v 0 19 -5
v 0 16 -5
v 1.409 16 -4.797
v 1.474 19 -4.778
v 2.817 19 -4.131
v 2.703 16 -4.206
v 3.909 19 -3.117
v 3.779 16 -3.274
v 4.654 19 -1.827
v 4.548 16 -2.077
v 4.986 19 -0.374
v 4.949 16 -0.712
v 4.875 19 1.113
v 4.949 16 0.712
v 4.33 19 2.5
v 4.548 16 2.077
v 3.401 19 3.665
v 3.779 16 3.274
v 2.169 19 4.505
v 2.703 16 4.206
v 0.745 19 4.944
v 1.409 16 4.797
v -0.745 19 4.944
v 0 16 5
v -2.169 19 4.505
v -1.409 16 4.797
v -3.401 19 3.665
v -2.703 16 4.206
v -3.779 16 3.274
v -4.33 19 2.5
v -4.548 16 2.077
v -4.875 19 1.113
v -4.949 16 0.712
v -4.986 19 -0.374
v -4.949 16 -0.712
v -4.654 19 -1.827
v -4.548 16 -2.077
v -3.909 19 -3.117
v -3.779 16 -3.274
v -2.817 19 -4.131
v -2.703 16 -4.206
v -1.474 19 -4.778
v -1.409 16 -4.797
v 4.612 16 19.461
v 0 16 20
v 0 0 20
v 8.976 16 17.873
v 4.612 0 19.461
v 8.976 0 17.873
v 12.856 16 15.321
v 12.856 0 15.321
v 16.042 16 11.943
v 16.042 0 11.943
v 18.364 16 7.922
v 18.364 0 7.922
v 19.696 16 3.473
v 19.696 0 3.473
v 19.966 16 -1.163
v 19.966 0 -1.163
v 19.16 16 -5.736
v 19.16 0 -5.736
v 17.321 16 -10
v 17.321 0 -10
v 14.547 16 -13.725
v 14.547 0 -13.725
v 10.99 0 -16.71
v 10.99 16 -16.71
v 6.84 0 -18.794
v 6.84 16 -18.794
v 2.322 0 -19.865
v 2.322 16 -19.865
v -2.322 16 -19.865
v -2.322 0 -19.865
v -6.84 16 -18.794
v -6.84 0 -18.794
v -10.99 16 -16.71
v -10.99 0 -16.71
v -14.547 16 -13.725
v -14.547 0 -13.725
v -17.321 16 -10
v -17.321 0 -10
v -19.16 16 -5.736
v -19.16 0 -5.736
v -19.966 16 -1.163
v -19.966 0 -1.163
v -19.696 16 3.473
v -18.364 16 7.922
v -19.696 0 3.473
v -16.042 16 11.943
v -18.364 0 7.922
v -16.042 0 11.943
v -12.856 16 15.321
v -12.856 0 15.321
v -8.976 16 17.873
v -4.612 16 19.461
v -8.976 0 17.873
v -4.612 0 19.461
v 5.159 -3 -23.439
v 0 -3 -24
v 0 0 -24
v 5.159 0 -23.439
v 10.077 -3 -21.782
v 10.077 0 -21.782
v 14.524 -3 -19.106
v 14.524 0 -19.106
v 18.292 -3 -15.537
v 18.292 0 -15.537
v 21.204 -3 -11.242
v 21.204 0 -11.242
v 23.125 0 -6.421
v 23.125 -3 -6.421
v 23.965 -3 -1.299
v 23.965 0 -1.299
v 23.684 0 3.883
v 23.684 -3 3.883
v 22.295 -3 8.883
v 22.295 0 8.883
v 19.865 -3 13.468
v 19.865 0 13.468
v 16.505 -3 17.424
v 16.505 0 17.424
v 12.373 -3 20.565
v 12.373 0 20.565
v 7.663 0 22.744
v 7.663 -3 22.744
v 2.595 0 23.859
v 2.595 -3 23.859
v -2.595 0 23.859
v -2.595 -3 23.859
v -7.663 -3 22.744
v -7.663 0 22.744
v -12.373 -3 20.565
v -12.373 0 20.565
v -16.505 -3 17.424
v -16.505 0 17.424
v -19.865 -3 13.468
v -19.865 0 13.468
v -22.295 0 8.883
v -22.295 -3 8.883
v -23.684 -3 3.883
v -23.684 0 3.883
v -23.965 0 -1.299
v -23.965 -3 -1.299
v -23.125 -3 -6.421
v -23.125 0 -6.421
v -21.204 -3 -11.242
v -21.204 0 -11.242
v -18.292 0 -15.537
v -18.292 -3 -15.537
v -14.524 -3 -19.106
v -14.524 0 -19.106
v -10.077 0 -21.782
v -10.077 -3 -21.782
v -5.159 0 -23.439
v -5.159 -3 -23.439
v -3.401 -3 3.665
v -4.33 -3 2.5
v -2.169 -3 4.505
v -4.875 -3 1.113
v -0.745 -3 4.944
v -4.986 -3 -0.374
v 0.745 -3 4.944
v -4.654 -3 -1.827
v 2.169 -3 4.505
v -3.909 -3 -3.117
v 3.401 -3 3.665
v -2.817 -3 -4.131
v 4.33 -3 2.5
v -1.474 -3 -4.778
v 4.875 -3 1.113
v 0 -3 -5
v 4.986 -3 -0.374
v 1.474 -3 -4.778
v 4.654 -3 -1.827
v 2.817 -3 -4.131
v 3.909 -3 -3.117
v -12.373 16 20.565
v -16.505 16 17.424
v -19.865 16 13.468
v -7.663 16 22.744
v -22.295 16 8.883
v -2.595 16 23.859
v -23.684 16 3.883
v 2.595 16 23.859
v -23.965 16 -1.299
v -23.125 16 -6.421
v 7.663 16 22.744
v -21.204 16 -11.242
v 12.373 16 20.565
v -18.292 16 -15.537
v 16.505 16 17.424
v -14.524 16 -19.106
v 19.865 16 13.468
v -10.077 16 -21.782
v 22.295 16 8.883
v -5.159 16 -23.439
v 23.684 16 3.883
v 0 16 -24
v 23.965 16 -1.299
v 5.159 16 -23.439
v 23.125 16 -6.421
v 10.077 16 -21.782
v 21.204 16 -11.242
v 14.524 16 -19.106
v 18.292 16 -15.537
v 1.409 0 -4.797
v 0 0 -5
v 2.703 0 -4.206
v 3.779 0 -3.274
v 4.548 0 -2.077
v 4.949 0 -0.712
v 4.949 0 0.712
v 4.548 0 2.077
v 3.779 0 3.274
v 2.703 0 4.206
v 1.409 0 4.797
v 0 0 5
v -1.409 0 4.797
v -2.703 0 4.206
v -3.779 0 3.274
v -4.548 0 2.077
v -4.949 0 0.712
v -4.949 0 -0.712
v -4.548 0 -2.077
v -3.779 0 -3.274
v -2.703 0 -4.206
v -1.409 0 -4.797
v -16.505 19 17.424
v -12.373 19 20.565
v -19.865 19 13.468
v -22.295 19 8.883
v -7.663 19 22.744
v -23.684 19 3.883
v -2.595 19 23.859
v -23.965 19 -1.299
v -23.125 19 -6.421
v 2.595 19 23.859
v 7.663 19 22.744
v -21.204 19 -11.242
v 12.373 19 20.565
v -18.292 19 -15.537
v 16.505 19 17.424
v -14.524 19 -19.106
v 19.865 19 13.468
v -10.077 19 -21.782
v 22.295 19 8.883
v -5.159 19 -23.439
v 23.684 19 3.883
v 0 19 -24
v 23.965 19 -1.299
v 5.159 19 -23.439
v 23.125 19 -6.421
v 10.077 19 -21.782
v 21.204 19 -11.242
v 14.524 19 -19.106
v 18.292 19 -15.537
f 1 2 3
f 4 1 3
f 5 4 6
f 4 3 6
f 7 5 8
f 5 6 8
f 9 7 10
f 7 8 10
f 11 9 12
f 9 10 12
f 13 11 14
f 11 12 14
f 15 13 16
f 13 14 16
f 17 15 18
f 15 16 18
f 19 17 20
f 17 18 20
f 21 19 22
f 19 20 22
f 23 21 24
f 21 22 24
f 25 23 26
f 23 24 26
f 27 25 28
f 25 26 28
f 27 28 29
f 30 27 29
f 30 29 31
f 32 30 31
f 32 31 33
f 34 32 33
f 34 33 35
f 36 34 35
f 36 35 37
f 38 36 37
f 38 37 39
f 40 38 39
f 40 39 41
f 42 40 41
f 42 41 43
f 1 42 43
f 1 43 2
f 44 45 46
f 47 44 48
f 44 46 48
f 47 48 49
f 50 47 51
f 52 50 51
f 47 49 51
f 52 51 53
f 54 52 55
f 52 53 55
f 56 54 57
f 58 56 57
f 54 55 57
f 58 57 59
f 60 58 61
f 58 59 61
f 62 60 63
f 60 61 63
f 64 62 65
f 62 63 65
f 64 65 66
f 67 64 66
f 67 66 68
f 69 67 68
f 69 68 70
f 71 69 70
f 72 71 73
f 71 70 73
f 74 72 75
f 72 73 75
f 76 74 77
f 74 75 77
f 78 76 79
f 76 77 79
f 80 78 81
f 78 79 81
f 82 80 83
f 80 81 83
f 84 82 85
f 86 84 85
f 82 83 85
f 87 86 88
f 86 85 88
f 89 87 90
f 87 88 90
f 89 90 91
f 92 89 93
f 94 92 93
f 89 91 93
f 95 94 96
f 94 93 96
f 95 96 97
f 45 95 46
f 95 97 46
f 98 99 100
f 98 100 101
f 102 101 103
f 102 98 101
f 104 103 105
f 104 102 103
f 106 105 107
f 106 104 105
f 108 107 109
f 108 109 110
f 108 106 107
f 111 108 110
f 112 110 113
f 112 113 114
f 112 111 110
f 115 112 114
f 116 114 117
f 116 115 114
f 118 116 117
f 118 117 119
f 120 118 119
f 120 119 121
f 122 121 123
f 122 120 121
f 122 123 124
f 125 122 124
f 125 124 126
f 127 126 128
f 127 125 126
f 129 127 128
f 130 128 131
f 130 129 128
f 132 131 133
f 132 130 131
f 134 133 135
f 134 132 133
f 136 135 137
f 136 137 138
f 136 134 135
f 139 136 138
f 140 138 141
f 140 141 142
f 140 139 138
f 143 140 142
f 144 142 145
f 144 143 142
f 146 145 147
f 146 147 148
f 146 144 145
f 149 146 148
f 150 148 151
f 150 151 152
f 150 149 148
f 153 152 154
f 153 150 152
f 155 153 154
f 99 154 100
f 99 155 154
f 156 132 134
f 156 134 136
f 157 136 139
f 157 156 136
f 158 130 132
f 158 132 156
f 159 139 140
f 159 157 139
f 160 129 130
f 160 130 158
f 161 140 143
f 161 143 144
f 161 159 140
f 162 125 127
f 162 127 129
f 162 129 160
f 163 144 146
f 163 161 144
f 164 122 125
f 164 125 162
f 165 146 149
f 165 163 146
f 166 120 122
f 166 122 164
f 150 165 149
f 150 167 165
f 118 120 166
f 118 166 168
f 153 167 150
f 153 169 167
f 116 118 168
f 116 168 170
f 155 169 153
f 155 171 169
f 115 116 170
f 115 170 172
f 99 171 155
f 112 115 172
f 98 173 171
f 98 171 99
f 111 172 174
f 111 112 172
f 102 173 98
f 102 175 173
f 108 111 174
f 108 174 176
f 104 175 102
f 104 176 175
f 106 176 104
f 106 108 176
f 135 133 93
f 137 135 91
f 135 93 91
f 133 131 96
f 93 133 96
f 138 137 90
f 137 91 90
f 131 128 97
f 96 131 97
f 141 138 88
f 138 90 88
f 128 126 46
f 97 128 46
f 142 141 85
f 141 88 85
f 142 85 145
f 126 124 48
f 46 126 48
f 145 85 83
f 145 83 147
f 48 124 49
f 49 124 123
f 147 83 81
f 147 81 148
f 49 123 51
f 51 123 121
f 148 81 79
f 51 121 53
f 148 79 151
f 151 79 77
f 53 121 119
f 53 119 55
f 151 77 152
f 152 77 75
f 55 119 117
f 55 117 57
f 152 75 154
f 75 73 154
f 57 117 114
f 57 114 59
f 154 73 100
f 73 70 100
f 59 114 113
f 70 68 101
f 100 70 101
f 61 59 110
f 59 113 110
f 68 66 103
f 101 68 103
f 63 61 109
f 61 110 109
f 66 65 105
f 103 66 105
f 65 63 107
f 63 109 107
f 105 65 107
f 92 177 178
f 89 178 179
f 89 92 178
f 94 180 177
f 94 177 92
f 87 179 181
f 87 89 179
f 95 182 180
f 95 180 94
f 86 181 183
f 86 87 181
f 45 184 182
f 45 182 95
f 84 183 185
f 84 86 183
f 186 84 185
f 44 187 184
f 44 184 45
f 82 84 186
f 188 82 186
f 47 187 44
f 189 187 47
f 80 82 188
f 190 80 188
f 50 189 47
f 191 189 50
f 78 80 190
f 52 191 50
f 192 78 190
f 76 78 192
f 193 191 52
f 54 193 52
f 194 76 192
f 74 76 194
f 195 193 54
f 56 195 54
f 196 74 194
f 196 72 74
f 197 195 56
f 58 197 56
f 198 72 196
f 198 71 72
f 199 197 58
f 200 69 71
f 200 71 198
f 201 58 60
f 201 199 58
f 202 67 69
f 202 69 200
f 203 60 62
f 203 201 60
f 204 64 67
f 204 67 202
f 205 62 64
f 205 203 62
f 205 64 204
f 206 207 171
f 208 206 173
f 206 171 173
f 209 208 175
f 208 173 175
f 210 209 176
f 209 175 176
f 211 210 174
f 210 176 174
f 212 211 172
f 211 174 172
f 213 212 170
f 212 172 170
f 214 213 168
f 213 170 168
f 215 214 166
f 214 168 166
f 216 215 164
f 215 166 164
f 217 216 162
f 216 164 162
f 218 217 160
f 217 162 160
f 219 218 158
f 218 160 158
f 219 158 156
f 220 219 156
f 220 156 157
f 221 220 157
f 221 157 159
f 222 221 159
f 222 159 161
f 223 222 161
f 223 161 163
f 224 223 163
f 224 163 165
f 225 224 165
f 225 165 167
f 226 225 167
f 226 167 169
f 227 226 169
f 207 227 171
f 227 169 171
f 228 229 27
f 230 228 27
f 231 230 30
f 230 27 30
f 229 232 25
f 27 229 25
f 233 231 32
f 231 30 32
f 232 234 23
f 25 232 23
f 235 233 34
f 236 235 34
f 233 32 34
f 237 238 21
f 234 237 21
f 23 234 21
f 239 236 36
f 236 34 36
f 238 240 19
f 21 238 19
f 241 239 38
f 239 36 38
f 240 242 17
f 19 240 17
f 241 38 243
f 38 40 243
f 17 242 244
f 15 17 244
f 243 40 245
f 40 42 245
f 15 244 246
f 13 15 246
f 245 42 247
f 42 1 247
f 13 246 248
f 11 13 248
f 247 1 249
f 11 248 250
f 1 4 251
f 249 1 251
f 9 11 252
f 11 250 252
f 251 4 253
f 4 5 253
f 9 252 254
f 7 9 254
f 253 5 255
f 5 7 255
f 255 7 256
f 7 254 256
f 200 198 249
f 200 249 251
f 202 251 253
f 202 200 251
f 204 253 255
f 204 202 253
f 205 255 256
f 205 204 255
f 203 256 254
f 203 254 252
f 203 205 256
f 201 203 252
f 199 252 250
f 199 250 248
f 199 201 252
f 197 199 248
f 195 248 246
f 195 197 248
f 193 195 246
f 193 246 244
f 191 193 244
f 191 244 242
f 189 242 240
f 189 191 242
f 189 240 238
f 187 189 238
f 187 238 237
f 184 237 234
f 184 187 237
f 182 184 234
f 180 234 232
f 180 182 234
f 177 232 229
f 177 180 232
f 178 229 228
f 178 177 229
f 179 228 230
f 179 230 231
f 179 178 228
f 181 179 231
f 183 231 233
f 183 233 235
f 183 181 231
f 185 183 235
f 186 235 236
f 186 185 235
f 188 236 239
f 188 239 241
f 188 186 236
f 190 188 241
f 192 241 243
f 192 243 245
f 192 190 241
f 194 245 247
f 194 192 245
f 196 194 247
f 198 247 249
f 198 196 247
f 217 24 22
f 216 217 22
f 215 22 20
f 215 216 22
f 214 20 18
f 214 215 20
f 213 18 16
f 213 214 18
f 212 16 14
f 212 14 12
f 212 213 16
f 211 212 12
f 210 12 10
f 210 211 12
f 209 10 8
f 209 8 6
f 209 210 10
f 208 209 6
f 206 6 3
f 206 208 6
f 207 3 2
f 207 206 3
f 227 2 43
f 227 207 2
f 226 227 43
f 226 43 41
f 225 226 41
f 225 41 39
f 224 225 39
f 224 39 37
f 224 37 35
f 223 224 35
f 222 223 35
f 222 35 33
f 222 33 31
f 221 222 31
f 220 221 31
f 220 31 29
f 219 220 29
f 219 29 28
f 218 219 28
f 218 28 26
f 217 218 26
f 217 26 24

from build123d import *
from build123d.topology import SkipClean

# Parameters (mm, degrees)
SKETCH_1_R      = 20
SKETCH_1_R_2    = 5
EXTRUDE_1_DEPTH = 16
EXTRUDE_START   = 3
SKETCH_2_R      = 24
SKETCH_2_R_2    = 5
EXTRUDE_2_DEPTH = 3
EXTRUDE_START_2 = -16
SKETCH_2_2_R    = 24
SKETCH_2_2_R_2  = 5
EXTRUDE_3_DEPTH = 3


with BuildPart() as part:
    # 草图1 → 凸台-拉伸1 (new body)
    with BuildSketch(Plane(origin=(0, 0, 0), x_dir=(1, 0, 0), z_dir=(0, 1, 0))):
        with Locations(Location((0, 0, 0), (0, 0, 270))):
            Circle(SKETCH_1_R)
        with Locations(Location((0, 0, 0), (0, 0, 270))):
            Circle(SKETCH_1_R_2, mode=Mode.SUBTRACT)
    extrude(amount=EXTRUDE_1_DEPTH)

    # 草图2 → 凸台-拉伸2 (add)
    with SkipClean():  # the faces are left unmerged after this step: merging them gives an invalid solid
        with BuildSketch(Plane.XZ.offset(EXTRUDE_START)):
            with Locations(Location((0, 0, 0), (0, 0, 270))):
                Circle(SKETCH_2_R)
            with Locations(Location((0, 0, 0), (0, 0, 270))):
                Circle(SKETCH_2_R_2, mode=Mode.SUBTRACT)
        extrude(amount=-EXTRUDE_2_DEPTH)

    # 草图2<2> → 凸台-拉伸3 (add)
    with BuildSketch(Plane.XZ.offset(EXTRUDE_START_2)):
        with Locations(Location((0, 0, 0), (0, 0, 270))):
            Circle(SKETCH_2_2_R)
        with Locations(Location((0, 0, 0), (0, 0, 270))):
            Circle(SKETCH_2_2_R_2, mode=Mode.SUBTRACT)
    extrude(amount=-EXTRUDE_3_DEPTH)


solid = part.part
